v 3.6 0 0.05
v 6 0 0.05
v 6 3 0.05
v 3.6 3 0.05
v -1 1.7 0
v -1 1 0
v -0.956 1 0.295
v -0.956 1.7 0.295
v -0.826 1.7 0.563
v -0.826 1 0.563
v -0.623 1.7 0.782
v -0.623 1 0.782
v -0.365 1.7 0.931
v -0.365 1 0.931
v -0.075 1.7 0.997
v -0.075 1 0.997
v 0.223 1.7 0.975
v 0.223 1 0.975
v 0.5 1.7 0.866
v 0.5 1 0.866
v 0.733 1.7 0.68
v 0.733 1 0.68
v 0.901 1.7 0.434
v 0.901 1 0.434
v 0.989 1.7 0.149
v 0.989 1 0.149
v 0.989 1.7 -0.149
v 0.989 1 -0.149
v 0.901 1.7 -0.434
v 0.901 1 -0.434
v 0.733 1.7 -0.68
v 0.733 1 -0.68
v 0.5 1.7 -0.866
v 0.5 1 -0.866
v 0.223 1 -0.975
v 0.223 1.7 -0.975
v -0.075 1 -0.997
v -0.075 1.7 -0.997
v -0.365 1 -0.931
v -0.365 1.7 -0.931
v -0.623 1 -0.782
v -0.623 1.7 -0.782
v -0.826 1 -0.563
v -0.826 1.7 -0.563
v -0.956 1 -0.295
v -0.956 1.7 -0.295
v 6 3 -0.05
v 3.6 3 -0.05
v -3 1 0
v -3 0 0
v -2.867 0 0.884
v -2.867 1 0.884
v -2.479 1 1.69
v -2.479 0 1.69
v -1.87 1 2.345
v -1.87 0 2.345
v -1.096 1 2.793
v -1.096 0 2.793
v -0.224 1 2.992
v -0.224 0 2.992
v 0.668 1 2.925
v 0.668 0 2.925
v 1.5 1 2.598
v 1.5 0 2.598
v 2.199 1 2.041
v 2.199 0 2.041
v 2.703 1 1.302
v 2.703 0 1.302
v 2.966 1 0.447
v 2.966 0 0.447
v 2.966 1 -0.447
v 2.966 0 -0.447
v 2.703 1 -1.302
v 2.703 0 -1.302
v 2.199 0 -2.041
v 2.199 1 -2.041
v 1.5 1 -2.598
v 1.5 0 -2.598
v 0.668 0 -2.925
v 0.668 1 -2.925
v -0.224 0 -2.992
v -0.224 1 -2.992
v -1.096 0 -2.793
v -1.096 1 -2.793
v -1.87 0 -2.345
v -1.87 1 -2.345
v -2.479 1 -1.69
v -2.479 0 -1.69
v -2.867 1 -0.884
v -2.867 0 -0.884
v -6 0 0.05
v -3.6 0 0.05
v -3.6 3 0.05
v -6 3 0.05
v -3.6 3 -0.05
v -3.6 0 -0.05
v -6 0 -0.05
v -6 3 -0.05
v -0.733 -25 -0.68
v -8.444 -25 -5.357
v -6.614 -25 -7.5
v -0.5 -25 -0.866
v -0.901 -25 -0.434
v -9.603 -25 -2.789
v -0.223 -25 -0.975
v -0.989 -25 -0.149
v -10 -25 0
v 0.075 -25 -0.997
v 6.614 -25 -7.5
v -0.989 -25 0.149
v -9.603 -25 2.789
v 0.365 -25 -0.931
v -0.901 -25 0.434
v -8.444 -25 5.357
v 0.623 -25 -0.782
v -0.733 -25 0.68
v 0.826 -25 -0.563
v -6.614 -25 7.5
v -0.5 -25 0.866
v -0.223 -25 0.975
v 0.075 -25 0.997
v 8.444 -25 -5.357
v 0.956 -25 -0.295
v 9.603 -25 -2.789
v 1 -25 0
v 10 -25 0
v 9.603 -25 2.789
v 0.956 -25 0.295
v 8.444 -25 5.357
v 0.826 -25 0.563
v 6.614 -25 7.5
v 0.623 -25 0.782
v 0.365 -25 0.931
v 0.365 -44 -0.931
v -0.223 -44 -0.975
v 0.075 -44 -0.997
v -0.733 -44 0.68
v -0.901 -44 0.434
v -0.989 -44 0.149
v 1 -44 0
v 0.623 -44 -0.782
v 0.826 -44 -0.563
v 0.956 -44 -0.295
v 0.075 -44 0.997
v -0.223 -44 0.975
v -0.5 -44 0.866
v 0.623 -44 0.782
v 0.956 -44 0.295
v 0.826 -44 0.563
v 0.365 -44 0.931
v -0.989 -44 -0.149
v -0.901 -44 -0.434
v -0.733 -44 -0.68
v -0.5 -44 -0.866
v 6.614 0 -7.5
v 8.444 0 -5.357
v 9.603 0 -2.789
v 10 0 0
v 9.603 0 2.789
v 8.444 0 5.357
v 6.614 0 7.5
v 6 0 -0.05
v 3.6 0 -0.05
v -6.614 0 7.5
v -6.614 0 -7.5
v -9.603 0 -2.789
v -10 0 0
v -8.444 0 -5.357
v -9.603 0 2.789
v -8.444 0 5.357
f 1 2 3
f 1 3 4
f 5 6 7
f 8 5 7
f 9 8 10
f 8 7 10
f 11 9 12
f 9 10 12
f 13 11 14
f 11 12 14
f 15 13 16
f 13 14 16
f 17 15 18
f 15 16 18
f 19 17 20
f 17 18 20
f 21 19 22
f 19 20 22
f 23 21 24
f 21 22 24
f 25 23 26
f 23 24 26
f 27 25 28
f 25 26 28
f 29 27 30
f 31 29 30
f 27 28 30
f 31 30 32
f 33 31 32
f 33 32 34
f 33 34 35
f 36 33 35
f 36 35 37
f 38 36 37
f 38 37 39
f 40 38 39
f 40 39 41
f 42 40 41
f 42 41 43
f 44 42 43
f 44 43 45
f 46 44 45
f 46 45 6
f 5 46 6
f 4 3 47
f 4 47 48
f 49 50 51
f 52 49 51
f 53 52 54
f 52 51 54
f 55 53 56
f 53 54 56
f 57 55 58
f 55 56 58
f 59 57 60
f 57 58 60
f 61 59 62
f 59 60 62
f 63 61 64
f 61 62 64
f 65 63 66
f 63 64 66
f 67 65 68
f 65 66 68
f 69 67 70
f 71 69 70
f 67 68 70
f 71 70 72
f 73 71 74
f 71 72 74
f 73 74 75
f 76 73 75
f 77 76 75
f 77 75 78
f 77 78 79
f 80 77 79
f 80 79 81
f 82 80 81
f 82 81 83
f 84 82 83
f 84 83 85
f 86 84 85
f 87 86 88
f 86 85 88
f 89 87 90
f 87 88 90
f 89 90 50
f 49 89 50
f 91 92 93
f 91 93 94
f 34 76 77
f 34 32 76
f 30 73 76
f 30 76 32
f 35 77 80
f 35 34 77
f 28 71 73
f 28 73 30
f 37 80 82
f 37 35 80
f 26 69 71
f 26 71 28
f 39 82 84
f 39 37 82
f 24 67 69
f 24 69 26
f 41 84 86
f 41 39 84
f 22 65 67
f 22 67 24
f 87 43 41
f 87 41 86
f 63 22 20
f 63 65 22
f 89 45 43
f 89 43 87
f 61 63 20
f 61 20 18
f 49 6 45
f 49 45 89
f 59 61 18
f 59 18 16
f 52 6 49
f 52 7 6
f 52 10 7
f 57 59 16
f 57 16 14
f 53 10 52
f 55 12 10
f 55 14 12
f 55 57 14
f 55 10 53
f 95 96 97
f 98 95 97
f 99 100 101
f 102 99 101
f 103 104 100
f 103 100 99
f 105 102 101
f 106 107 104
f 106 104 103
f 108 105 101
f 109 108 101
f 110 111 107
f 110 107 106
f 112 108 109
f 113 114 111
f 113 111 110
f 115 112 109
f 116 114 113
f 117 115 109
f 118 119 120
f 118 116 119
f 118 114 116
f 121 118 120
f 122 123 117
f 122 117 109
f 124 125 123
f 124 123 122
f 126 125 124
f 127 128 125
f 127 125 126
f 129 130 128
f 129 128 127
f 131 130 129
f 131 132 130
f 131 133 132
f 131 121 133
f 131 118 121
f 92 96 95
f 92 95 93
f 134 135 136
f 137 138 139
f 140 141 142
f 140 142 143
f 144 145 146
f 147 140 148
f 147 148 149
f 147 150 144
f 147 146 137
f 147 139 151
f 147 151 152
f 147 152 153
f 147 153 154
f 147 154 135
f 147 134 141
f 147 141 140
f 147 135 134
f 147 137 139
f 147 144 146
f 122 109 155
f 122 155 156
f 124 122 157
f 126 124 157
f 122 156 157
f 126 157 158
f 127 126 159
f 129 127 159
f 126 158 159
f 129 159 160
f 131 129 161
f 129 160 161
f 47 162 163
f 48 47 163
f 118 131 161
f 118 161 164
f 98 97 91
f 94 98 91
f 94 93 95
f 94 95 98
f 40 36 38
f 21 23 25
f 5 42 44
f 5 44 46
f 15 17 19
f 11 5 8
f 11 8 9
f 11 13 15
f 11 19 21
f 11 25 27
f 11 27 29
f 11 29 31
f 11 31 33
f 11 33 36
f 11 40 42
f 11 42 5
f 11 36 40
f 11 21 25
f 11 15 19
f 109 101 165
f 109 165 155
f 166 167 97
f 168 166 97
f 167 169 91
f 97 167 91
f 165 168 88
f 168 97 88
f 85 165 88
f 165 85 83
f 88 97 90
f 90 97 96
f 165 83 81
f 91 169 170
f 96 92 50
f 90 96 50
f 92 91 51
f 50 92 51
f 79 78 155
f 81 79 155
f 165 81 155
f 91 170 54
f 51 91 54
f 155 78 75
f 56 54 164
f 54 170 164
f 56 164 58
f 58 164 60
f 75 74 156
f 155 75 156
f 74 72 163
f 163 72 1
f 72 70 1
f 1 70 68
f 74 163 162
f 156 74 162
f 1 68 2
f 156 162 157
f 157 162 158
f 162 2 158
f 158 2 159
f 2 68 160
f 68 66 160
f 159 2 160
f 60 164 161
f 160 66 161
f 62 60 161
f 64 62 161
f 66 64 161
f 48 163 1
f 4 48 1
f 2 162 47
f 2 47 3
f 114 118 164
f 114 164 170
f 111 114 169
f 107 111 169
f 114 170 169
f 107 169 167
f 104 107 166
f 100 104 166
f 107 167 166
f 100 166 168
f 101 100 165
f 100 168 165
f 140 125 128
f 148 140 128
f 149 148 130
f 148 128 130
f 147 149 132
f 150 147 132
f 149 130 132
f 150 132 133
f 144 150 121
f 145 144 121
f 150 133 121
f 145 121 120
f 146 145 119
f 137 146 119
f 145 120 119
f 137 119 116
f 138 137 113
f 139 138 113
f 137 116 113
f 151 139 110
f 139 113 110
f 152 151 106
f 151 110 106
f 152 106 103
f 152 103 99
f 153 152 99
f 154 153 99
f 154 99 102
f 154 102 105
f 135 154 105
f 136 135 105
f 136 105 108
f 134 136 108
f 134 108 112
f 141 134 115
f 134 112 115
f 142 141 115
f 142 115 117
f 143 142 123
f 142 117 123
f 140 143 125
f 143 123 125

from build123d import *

# Parameters (mm, degrees)
F1_DEPTH = 25
F2_W     = 2.4
F2_H     = 0.1
F3_DEPTH = 3
F4_R     = 3
F4_R_2   = 1
F5_DEPTH = 1
F6_R     = 1
F7_DEPTH = 1.7
F8_R     = 1
F9_DEPTH = 19


with BuildPart() as f1:
    # F0 (on Front) → F1 (new body)
    with BuildSketch(Plane.XZ):
        with BuildLine():
            Line((6.614378, 7.5), (-6.614378, 7.5))
            ThreePointArc((-6.614378, 7.5), (-10, 0), (-6.614378, -7.5))
            Line((-6.614378, -7.5), (6.614378, -7.5))
            ThreePointArc((6.614378, -7.5), (10, 0), (6.614378, 7.5))
        make_face()
    extrude(amount=F1_DEPTH)

    # F2 (on face) → F3 (join)
    with BuildSketch(Plane(origin=(0, 0, 0), x_dir=(-1, 0, 0), z_dir=(0, 1, 0))):
        with Locations((-4.8, 0)):
            Rectangle(F2_W, F2_H)
        with Locations((4.8, 0)):
            Rectangle(F2_W, F2_H)
    extrude(amount=F3_DEPTH)

    # F4 (on face) → F5 (join)
    with BuildSketch(Plane(origin=(0, 0, 0), x_dir=(-1, 0, 0), z_dir=(0, 1, 0))):
        Circle(F4_R)
        Circle(F4_R_2, mode=Mode.SUBTRACT)
    extrude(amount=F5_DEPTH)

    # F6 (on face) → F7 (join)
    with BuildSketch(Plane(origin=(0, 0, 0), x_dir=(-1, 0, 0), z_dir=(0, 1, 0))):
        Circle(F6_R)
    extrude(amount=F7_DEPTH)

    # F8 (on face) → F9 (join)
    with BuildSketch(Plane.XZ.offset(25)):
        Circle(F8_R)
    extrude(amount=F9_DEPTH)


solid = f1.part
